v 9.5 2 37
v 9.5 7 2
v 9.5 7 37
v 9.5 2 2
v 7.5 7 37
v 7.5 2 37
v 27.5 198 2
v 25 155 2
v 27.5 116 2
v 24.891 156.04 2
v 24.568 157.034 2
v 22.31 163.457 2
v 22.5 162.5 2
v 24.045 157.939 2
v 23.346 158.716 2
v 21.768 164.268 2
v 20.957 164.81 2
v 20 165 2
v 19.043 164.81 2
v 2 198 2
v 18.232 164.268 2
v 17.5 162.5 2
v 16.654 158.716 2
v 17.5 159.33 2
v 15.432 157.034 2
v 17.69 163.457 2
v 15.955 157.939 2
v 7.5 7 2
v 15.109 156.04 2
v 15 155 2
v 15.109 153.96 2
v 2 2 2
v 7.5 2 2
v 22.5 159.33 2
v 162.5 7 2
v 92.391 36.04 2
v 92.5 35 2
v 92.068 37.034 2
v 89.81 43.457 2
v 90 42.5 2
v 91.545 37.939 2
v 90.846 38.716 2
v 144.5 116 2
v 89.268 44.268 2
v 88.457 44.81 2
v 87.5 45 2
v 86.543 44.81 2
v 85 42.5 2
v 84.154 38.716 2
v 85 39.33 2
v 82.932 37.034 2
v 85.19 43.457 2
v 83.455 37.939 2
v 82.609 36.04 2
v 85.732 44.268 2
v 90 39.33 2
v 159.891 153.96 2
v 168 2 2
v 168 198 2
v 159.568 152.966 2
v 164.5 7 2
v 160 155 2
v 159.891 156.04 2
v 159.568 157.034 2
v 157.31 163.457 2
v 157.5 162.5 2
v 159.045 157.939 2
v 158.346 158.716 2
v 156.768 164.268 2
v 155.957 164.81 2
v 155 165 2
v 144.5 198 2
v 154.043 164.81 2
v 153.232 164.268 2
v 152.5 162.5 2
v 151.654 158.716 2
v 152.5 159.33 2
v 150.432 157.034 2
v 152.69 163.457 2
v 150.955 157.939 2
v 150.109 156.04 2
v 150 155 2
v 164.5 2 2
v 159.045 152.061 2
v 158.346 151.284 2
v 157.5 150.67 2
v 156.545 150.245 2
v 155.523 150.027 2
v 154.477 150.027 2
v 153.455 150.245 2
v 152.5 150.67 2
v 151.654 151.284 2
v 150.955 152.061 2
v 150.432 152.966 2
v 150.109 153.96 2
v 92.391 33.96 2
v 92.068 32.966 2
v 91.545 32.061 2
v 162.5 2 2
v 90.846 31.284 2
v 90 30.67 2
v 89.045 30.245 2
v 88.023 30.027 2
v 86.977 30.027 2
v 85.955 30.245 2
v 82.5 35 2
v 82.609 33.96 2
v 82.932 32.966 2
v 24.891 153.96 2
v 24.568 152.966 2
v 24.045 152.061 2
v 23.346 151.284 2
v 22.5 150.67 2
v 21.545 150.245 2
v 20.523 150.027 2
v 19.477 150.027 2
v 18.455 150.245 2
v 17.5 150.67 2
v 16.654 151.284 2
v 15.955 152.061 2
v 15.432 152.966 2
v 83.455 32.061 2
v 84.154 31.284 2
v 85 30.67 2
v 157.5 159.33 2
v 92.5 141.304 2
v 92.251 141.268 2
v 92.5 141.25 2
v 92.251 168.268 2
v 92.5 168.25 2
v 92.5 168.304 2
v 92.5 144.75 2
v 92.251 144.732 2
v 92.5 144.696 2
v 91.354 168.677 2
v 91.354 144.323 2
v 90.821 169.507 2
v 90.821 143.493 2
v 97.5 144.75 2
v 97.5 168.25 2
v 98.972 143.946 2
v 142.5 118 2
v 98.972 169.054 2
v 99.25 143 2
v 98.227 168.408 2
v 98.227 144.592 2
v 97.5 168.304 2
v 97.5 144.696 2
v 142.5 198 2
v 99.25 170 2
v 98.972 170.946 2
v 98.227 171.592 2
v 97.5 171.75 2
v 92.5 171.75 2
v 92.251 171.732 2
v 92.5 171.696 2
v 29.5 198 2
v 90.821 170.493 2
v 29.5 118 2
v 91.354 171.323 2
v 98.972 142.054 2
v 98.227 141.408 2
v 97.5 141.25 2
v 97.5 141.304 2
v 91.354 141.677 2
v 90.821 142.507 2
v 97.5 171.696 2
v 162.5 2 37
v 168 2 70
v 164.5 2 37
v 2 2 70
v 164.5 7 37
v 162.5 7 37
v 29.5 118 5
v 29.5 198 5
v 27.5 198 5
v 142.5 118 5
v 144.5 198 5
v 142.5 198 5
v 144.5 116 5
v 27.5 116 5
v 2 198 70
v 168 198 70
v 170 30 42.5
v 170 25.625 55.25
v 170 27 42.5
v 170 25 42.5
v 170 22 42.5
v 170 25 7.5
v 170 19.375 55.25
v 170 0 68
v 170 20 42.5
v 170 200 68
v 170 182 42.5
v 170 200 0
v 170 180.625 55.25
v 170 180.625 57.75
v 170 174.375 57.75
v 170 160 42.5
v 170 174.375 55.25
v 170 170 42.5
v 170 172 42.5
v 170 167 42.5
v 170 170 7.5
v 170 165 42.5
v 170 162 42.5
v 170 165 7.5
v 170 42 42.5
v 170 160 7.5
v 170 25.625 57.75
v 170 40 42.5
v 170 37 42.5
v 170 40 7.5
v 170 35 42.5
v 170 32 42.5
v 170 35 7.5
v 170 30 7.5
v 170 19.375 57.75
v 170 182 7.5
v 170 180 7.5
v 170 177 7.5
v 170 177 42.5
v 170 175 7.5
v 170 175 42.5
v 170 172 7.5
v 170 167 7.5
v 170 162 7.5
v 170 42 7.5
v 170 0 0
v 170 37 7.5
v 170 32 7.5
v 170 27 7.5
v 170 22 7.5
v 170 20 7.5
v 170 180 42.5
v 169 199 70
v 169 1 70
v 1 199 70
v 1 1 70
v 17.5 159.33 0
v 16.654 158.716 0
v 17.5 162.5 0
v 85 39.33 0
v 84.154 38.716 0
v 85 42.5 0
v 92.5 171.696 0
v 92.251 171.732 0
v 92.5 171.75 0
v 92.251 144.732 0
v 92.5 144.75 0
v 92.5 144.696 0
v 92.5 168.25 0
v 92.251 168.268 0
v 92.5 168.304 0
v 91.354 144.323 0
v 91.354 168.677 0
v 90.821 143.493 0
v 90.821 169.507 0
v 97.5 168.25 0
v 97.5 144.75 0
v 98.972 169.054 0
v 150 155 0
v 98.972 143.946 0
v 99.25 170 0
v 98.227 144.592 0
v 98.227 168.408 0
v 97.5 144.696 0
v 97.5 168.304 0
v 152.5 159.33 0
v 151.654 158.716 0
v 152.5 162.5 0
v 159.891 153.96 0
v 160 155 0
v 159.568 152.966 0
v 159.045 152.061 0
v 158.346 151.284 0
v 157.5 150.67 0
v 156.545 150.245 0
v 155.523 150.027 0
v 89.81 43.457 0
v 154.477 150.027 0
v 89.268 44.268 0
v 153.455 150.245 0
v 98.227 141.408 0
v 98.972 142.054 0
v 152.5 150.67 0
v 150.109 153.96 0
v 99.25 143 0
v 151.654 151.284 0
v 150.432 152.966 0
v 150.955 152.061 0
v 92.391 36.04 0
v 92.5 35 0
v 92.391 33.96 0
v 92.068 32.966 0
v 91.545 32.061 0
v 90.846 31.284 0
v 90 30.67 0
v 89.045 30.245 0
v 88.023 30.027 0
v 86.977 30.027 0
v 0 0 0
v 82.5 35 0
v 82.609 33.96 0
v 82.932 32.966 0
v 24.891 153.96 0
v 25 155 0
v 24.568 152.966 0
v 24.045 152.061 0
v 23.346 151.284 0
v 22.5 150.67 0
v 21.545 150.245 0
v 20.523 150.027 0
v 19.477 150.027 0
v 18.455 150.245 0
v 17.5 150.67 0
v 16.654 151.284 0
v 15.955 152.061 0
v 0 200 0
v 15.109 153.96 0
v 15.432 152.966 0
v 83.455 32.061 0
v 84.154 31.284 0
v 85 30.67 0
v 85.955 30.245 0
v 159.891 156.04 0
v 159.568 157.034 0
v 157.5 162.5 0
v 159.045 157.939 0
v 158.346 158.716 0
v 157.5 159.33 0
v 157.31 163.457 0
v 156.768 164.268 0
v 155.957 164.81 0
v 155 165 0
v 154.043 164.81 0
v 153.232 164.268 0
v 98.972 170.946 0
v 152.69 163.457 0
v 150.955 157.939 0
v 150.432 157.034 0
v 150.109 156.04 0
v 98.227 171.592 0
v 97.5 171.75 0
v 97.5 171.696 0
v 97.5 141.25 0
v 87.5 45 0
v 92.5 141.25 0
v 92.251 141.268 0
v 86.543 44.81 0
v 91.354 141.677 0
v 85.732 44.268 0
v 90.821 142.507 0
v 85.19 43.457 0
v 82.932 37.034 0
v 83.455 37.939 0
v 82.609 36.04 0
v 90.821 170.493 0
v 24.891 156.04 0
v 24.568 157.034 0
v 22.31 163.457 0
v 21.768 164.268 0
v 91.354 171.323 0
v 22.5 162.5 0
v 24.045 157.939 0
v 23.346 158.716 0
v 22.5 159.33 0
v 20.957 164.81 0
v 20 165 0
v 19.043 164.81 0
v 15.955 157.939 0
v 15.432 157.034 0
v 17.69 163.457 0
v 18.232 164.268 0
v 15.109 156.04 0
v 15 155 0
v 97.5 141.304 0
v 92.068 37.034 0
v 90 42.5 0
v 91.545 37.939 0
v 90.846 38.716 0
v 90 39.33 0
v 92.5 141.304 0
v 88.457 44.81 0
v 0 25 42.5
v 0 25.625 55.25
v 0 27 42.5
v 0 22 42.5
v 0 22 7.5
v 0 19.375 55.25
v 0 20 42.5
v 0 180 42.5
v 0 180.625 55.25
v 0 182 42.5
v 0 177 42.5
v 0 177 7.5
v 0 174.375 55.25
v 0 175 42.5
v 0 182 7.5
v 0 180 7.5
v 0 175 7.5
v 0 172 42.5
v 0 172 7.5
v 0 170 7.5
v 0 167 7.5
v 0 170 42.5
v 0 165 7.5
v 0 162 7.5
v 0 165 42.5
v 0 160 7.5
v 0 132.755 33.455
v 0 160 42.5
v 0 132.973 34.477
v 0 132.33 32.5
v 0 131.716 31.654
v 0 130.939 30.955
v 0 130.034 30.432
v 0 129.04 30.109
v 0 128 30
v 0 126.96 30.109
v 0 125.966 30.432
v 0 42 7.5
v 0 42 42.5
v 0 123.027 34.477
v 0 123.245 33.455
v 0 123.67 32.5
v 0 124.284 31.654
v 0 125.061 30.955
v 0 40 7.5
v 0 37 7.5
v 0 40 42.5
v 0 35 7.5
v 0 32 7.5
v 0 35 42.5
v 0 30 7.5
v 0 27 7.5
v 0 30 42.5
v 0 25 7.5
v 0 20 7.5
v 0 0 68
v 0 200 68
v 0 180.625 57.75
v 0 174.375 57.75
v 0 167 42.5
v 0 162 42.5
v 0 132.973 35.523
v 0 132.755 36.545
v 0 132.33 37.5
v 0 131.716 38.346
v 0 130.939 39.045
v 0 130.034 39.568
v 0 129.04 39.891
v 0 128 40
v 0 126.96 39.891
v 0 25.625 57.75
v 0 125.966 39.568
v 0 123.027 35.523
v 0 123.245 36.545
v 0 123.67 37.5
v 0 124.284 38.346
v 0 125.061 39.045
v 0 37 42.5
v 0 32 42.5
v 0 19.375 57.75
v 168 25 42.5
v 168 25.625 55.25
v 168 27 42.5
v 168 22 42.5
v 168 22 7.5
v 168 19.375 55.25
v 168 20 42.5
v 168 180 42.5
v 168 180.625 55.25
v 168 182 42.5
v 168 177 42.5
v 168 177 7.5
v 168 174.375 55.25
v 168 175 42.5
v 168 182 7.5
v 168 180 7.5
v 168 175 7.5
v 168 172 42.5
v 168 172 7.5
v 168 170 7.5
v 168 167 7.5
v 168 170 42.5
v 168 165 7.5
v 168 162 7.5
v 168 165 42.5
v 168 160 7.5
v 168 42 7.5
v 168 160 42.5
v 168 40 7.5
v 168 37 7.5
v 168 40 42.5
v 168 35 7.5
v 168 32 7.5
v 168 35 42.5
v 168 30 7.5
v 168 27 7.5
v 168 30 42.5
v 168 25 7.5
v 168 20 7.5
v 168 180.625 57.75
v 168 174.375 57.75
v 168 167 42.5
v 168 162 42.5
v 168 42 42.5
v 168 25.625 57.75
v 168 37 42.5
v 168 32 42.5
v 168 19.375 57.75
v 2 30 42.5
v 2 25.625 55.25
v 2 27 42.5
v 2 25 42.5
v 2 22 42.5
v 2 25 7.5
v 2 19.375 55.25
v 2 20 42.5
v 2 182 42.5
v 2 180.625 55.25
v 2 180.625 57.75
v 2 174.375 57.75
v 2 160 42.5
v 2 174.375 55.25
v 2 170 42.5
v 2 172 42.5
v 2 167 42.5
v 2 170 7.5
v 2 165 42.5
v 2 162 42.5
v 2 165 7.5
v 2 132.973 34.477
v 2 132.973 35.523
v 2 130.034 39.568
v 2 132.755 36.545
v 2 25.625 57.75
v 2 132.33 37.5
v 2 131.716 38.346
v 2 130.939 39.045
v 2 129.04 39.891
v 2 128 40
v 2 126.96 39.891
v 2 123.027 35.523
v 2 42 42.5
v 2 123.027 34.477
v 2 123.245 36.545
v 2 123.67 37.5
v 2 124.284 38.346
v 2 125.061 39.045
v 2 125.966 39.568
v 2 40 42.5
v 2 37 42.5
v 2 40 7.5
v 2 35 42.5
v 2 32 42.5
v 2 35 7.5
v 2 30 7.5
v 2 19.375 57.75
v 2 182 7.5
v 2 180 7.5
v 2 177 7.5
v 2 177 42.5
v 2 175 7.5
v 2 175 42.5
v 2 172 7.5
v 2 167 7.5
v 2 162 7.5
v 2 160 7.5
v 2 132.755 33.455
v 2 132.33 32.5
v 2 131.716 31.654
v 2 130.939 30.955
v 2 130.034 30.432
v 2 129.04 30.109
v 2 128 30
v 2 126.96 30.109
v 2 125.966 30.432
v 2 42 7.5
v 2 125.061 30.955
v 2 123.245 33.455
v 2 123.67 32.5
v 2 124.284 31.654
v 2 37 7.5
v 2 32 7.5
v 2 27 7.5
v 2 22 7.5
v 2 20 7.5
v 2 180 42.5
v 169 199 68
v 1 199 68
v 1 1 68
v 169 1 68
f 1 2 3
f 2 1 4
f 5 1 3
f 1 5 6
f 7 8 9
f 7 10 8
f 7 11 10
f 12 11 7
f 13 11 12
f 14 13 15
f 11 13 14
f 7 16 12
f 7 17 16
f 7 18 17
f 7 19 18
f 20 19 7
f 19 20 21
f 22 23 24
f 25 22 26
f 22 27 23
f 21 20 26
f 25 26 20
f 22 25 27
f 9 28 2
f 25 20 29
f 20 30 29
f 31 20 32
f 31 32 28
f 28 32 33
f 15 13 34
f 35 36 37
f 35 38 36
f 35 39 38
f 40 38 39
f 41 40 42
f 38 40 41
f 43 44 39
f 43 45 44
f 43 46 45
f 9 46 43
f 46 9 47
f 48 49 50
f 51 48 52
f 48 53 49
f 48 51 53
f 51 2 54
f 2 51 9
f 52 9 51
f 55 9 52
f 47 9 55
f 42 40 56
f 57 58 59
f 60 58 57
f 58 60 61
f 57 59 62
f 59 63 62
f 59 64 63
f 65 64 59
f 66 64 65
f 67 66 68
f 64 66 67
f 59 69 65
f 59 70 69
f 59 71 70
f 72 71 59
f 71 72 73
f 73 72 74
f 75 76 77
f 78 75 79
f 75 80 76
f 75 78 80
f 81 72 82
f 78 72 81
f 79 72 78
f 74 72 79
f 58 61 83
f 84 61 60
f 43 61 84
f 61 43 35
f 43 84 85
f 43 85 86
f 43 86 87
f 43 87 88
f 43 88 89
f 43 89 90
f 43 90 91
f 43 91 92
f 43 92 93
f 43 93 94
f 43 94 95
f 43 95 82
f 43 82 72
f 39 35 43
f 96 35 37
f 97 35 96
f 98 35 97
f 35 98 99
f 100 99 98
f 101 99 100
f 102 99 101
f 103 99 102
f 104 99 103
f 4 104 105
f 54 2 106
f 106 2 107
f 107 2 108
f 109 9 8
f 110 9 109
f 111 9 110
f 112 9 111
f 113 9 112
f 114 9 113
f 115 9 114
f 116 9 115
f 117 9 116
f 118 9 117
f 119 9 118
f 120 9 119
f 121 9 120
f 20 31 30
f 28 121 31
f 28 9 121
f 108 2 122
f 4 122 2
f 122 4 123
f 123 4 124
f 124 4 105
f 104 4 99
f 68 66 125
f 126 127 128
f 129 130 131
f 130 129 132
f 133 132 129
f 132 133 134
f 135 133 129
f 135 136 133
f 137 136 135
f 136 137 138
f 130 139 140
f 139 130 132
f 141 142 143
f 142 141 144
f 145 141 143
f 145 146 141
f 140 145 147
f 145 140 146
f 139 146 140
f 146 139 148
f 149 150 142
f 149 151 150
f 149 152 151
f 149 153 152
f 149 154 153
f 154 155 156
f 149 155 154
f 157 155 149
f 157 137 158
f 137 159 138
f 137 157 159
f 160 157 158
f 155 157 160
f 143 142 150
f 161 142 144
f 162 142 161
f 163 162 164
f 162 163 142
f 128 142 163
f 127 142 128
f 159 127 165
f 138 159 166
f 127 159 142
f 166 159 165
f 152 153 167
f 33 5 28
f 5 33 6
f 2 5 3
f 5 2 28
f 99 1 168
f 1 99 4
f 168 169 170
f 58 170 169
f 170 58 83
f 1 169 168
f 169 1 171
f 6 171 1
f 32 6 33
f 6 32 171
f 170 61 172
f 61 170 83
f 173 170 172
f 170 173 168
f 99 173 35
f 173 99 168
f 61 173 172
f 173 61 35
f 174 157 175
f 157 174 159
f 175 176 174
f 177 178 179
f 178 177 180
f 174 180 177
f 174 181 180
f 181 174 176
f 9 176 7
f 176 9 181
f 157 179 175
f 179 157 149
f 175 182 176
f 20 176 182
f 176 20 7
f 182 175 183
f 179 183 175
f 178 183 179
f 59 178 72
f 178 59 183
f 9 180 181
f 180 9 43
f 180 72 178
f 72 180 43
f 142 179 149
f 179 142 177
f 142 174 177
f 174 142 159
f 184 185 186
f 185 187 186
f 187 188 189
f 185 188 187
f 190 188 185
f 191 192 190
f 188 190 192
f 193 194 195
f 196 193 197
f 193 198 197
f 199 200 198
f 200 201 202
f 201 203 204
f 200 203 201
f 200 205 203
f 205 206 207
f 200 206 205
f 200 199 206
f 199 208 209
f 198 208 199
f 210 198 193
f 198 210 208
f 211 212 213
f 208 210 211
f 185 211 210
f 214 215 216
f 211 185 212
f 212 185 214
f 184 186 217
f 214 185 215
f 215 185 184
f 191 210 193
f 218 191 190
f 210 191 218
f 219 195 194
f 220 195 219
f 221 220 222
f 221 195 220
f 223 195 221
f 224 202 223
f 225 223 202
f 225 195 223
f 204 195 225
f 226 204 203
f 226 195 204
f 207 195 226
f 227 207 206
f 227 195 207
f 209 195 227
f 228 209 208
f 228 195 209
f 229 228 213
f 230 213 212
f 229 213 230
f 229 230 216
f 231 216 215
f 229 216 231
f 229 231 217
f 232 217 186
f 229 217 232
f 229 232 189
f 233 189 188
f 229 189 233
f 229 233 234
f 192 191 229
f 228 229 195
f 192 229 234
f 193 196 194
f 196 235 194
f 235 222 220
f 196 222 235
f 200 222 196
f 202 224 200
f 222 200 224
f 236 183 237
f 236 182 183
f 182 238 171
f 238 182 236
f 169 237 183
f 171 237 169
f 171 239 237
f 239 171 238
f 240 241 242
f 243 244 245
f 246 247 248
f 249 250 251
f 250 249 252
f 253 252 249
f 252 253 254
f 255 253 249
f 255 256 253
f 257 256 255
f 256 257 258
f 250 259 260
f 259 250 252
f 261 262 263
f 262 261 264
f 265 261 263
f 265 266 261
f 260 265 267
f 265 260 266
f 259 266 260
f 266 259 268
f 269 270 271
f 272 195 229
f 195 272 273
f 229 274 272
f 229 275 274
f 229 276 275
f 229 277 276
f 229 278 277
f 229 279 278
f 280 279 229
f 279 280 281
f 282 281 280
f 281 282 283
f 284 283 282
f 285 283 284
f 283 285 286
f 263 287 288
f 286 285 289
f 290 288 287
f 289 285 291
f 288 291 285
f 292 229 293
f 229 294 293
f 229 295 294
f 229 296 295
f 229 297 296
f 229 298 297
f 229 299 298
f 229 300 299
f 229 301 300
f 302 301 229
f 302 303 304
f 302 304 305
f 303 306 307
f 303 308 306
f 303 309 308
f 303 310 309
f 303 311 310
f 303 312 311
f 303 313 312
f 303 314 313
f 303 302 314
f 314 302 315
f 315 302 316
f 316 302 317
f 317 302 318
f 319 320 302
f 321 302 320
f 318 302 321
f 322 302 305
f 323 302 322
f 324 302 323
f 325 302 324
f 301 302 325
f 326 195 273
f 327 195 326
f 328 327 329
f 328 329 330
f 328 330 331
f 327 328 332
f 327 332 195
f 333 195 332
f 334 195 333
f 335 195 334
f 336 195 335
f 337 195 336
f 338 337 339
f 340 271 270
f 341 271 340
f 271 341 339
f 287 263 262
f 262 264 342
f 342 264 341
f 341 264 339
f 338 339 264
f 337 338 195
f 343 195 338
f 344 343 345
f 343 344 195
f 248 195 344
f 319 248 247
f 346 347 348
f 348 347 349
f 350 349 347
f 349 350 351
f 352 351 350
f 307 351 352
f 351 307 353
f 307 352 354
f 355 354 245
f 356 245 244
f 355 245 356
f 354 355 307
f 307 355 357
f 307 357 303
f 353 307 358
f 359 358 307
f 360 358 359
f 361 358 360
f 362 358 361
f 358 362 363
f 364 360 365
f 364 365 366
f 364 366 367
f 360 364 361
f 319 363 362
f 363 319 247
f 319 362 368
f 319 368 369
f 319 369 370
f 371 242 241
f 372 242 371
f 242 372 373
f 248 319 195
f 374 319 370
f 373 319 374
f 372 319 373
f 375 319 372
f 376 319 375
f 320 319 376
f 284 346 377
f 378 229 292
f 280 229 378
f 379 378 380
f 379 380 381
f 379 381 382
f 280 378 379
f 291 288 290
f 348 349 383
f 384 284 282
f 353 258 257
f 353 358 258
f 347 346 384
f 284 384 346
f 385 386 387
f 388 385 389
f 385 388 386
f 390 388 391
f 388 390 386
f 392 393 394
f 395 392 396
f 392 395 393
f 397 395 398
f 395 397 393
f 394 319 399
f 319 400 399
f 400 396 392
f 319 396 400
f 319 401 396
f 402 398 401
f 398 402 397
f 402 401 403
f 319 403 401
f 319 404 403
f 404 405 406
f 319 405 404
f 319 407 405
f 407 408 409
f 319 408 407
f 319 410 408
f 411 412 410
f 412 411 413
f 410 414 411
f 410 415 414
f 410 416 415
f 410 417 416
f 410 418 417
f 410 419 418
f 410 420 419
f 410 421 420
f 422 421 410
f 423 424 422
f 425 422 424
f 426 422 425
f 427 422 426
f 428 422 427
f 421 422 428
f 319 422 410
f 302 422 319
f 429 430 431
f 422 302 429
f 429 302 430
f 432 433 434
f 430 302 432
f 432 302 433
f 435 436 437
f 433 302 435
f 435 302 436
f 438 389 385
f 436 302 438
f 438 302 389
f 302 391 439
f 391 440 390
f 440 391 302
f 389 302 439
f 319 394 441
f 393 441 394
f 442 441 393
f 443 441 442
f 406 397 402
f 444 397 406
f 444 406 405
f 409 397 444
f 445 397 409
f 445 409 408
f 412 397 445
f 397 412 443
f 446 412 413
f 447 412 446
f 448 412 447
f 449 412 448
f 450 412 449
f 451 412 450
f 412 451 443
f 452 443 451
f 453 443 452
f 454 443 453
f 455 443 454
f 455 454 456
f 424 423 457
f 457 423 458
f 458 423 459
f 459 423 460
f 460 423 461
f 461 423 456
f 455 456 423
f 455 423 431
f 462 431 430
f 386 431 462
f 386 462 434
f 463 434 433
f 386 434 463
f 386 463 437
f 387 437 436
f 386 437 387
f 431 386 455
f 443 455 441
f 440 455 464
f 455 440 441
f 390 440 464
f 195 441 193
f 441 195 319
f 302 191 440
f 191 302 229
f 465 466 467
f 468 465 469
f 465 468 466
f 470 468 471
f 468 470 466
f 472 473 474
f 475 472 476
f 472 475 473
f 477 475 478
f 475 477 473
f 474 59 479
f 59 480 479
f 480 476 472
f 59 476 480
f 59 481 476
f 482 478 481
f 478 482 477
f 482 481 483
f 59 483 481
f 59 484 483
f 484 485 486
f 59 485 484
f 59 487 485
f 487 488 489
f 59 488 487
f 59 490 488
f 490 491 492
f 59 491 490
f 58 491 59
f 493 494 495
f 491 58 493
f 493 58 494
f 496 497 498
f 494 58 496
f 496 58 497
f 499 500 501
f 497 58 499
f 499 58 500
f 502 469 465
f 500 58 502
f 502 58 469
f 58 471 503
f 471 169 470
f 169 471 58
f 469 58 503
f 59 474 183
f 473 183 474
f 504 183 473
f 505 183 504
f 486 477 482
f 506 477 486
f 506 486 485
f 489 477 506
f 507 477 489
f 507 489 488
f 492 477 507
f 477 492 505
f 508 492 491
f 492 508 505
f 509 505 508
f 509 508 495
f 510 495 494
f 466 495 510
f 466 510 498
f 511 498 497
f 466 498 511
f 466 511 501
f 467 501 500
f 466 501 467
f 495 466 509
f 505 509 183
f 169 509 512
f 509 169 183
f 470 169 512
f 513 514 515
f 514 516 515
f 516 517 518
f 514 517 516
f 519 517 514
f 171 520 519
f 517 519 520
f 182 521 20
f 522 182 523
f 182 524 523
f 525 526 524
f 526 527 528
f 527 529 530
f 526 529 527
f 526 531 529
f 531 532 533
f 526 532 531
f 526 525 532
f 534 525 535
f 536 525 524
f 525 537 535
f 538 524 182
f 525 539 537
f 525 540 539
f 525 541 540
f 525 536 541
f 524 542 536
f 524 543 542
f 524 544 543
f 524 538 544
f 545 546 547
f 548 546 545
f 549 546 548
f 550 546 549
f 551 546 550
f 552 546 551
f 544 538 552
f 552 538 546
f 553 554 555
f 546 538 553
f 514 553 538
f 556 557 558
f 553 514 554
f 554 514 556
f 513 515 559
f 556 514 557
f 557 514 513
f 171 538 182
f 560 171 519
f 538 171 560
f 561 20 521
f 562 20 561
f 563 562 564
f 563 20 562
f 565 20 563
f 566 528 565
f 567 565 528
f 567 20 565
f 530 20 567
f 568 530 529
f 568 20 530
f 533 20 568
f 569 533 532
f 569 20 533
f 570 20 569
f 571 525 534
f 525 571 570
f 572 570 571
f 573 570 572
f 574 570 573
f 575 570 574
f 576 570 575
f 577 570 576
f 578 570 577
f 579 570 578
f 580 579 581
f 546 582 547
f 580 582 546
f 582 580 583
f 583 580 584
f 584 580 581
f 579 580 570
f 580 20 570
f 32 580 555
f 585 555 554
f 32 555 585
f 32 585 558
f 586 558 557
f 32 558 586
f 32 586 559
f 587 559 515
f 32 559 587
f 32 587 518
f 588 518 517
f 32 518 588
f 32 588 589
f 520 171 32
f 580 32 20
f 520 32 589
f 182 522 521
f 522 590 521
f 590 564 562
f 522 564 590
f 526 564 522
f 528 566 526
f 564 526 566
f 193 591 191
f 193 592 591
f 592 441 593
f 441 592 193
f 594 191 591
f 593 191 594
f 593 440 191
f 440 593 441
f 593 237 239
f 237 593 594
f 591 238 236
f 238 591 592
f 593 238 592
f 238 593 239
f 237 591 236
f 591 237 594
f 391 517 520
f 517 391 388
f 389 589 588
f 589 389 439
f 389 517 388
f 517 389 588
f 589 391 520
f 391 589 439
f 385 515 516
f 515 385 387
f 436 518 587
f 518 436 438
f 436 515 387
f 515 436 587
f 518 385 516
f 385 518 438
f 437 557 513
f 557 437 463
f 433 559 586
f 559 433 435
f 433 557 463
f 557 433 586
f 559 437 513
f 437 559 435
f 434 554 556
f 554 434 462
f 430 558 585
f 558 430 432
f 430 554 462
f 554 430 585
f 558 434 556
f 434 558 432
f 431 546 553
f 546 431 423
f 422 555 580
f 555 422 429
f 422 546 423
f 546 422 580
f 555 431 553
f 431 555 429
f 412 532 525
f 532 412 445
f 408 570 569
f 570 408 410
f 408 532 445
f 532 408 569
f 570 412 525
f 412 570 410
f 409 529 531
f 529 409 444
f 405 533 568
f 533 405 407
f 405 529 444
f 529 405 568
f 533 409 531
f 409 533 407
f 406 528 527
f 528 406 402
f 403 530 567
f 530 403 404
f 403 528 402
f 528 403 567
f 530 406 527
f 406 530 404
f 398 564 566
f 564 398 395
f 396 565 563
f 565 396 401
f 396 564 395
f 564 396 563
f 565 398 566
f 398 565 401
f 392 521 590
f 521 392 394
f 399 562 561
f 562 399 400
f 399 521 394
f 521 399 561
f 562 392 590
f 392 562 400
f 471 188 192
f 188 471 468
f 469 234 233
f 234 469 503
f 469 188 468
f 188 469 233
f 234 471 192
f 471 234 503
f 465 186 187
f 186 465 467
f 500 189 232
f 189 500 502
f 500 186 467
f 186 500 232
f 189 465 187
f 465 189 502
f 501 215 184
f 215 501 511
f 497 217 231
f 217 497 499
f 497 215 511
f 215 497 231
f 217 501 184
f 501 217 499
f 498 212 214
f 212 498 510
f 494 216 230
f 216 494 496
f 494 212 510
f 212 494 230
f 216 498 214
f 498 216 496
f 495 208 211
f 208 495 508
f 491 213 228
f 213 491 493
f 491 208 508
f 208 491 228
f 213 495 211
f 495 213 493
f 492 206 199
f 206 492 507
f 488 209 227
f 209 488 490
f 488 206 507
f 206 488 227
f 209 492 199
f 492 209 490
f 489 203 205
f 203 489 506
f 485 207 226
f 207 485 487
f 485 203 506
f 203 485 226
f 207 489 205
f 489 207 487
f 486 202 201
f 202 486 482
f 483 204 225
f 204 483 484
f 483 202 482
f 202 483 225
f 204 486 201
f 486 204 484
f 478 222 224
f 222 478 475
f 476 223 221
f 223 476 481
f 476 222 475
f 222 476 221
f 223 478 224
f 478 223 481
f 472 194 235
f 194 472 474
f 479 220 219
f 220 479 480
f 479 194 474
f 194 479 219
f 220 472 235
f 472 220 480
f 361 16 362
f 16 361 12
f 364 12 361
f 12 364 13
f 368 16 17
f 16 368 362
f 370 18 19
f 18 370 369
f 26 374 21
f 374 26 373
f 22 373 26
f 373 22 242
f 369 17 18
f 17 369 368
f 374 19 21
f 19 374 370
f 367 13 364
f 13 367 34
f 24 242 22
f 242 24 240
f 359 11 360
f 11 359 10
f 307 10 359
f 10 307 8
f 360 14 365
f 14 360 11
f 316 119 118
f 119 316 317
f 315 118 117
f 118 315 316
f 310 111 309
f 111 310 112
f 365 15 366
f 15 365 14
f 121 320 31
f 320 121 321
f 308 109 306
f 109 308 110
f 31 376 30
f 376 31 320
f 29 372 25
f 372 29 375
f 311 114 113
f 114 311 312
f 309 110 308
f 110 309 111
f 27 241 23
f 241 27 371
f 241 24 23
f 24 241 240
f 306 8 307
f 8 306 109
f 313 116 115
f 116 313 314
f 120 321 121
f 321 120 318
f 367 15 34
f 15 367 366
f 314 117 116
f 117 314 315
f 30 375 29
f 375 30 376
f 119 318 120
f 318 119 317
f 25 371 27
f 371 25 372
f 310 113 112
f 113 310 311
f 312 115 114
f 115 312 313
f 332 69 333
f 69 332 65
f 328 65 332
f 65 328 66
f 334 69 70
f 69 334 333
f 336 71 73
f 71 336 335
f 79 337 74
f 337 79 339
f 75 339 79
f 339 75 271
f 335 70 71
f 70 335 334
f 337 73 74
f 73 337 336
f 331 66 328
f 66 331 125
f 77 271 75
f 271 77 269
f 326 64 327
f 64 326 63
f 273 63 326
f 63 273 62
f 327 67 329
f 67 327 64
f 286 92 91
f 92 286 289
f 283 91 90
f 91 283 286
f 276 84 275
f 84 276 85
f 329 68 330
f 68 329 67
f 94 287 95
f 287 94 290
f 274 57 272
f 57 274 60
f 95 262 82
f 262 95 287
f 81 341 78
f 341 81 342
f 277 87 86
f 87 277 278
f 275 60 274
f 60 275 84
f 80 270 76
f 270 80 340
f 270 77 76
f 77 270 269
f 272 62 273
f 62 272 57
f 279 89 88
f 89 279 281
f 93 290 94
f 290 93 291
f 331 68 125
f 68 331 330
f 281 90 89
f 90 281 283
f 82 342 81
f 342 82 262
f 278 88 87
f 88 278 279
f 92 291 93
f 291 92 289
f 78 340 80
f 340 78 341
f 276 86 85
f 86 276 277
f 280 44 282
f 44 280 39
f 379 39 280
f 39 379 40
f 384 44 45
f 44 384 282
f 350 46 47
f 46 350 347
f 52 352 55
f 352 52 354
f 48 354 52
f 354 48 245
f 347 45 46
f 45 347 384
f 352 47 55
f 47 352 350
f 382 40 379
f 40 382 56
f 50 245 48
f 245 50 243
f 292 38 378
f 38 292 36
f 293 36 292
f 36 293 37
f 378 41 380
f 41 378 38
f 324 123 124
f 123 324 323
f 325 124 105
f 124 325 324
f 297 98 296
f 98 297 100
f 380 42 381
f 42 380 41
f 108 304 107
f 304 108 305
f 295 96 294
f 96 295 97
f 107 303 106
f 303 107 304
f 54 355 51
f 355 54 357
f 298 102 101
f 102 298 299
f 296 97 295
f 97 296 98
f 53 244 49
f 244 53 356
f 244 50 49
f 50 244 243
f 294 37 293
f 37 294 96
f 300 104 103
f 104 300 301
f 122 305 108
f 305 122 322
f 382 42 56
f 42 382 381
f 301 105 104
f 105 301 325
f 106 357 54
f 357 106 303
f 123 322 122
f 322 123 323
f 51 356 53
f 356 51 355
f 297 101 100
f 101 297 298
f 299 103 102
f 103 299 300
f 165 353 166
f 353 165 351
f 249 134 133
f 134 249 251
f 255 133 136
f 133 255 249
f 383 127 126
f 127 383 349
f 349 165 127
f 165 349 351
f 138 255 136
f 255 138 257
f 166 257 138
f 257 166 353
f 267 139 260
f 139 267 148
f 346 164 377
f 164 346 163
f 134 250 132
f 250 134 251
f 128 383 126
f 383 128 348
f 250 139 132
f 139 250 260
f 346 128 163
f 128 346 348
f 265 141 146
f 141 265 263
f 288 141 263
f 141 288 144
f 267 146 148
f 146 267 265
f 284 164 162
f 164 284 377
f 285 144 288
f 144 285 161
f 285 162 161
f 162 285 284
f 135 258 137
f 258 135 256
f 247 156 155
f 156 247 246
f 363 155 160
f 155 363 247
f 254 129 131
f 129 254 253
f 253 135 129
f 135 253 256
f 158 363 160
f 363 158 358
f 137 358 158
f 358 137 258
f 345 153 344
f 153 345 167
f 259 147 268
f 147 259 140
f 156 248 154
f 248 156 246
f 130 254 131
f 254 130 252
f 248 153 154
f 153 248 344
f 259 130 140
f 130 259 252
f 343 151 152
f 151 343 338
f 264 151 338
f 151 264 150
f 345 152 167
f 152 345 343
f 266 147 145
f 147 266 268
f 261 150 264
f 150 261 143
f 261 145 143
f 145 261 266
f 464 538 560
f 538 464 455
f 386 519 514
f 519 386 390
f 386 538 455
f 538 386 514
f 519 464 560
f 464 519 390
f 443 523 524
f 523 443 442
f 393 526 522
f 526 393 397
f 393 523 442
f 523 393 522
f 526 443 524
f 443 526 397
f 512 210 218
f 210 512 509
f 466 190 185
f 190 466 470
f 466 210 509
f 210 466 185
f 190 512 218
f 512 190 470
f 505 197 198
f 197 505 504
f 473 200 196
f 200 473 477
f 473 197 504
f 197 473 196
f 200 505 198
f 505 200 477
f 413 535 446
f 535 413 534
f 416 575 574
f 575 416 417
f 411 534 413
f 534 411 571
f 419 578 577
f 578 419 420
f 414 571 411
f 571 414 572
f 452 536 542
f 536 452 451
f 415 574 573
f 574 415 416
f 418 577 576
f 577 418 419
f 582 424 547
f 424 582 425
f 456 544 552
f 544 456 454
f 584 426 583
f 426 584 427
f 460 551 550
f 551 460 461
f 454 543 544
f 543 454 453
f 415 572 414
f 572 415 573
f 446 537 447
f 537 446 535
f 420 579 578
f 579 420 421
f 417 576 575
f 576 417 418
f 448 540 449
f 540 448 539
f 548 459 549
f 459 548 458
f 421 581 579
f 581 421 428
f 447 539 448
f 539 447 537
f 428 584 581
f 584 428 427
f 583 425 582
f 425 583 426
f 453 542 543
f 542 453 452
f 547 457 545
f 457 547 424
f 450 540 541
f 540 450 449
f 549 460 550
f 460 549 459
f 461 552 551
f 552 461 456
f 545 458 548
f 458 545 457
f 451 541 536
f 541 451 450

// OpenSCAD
// ===========================================================================
//  Copyright (C) 2021   Walter Pirri
//
//  This library is free software; you can redistribute it and/or
//  modify it under the terms of the GNU Lesser General Public
//  License as published by the Free Software Foundation; either
//  version 2.1 of the License, or (at your option) any later version.
//
//  This library is distributed in the hope that it will be useful,
//  but WITHOUT ANY WARRANTY; without even the implied warranty of
//  MERCHANTABILITY or FITNESS FOR A PARTICULAR PURPOSE.  See the GNU
//  Lesser General Public License for more details.
//
//  You should have received a copy of the GNU Lesser General Public
//  License along with this library; if not, write to the Free Software
//  Foundation, Inc., 59 Temple Place, Suite 330, Boston, MA  02111-1307  USA
// ===========================================================================

// ===========================================================================
// Cuerpo de la caja para central de domotica
// HELP: https://en.wikibooks.org/wiki/OpenSCAD_User_Manual/Primitive_Solids
// ===========================================================================

inicial=[0,0,0];
$fs = 1;

// Medidas de la caja y tapa
ancho=170;
alto=200;
profundidad=70;
pared=2;
ancho_bateria = 155;
ancho_fuente = 115;
alto_fuente = 82;

// Detalles de la caja (se usan tambien en la Tapa)
profundidad_calado=2;   // Calado superior en los bodes

// Detalles de la Tapa (Se usan también en la caja)
traba_ancho=5;
traba_alto=13;
traba_pestana=1;
traba_distancia_vertical=20;
orificio_cables = 10;


//
// Caja
//

module entrada_cables()
{
    translate(inicial + [0, alto-alto_fuente+orificio_cables, profundidad/2]) rotate([0,90, 0]) cylinder(h=pared, d=orificio_cables, center=false);
}


module tornillo_fuente()
{
    diametro_orificio = 3.5;
    h_orificio1 = 25;
    h_orificio2 = 52;

    pos_orificio_i = 65;
    pos_orificio_d = 70;
    diff_orificios = pos_orificio_d - pos_orificio_i;
    
    tope_derecho_fuente = (ancho / 2) - (ancho_fuente / 2);
    
    translate(inicial + [tope_derecho_fuente + pos_orificio_i, (alto - alto_fuente + h_orificio1), 0])
        cylinder(h = pared, d = diametro_orificio, center = false);
    translate(inicial + [tope_derecho_fuente + pos_orificio_i, (alto - alto_fuente + h_orificio1 - (diametro_orificio/2)), 0])
        cube([diff_orificios,diametro_orificio,pared]);
    translate(inicial + [tope_derecho_fuente + pos_orificio_d, (alto - alto_fuente + h_orificio1), 0])
        cylinder(h = pared, d = diametro_orificio, center = false);
    
    translate(inicial + [tope_derecho_fuente + pos_orificio_i, (alto - alto_fuente + h_orificio2), 0])
        cylinder(h = pared, d = diametro_orificio, center = false);
    translate(inicial + [tope_derecho_fuente + pos_orificio_i, (alto - alto_fuente + h_orificio2 - (diametro_orificio/2)), 0])
        cube([diff_orificios,diametro_orificio,pared]);
    translate(inicial + [tope_derecho_fuente + pos_orificio_d, (alto - alto_fuente + h_orificio2), 0])
        cylinder(h = pared, d = diametro_orificio, center = false);
}

module seccion_fuente()
{
    tope_fuente_x1 = (ancho / 2) - (ancho_fuente / 2);
    tope_fuente_x2 = (ancho / 2) + (ancho_fuente / 2);
    tope_fuente = 3;

    translate(inicial + [tope_fuente_x1, (alto-pared-alto_fuente), pared]) cube([2,alto_fuente,tope_fuente]);
    translate(inicial + [tope_fuente_x2, (alto-pared-alto_fuente), pared]) cube([2,alto_fuente,tope_fuente]);

    translate(inicial + [tope_fuente_x1, (alto-pared-alto_fuente), pared]) cube([ancho_fuente,2,tope_fuente]);
    
}

module tope_bateria()
{
    tope_bateria_x1 = (ancho / 2) - (ancho_bateria / 2);
    tope_bateria_x2 = (ancho / 2) + (ancho_bateria / 2);
    translate(inicial + [tope_bateria_x1, pared, pared]) cube([2,5,(profundidad/2)]);
    translate(inicial + [tope_bateria_x2, pared, pared]) cube([2,5,(profundidad/2)]);
}

module orificio_fijacion(xyz)
{
    translate(xyz + [2.5,2.5,0]) cylinder(h=pared, d=5, center=false);
    translate(xyz - [0,2.5,0]) cube([5,5,pared], center=false);
    translate(xyz + [2.5,0,0] - [0,5,0]) cylinder(h=pared, d=10, center=false);
}

module ventilacion_z(xyz, largo)
{
    translate(xyz) cube([pared,2,largo]);
    translate(xyz + [0,5,0]) cube([pared,2,largo]);
    translate(xyz + [0,10,0]) cube([pared,2,largo]);
    translate(xyz + [0,15,0]) cube([pared,2,largo]);
    translate(xyz + [0,20,0]) cube([pared,2,largo]);
}

module cajon(xyz, x, y, z, p)
{
    tope_bateria();
    seccion_fuente();
    difference()
    {
        translate(xyz) cube([x,y,z], false);
        translate(xyz + [p,p,p]) cube([x-(2*p),y-(2*p),z], false);
    }
}

module calado_borde(xyz, b, h)
{
    translate(xyz) cube([b, (pared/2), profundidad_calado], false);
    translate(xyz+[0,h-1,0]) cube([b, (pared/2), profundidad_calado], false);
    translate(xyz) cube([(pared/2), h, profundidad_calado], false);
    translate(xyz+[b-1,0,0]) cube([(pared/2), h, profundidad_calado], false);
    
}

module orificio_traba(xyz, dir)
{
    if(dir == 1)
    {
        translate(xyz-[0,(traba_ancho*0.125),0]+[0,0,(pared*0.125)]) cube([pared,(traba_ancho*1.25),(pared*1.25)], false);
    }
    else
    {
        translate(xyz-[pared,(traba_ancho*0.125),0]+[0,0,(pared*0.125)]) cube([pared,(traba_ancho*1.25),(pared*1.25)], false);
    }
}

module Caja()
{
    difference()
    {
        cajon(inicial, ancho, alto, profundidad, pared);
        // -- menos -->
        calado_borde(inicial + [0,0,profundidad-2], ancho, alto);
        orificio_traba([0,traba_distancia_vertical,profundidad-traba_alto-pared], 1);
        orificio_traba([0,alto-traba_distancia_vertical-traba_ancho,profundidad-traba_alto-pared], 1);
        
        orificio_traba([ancho,traba_distancia_vertical,profundidad-traba_alto-pared], 2);
        orificio_traba([ancho,alto-traba_distancia_vertical-traba_ancho,profundidad-traba_alto-pared], 2);
        
        ventilacion_z([0,20,(profundidad/4)-10], (profundidad/2));
        ventilacion_z([0,(alto-40),(profundidad/4)-10], (profundidad/2));
        
        ventilacion_z([(ancho-pared),20,(profundidad/4)-10], (profundidad/2));
        ventilacion_z([(ancho-pared),(alto-40),(profundidad/4)-10], (profundidad/2));
        
        orificio_fijacion([((ancho/2)-(ancho_fuente/2)-10),alto-40,0]);
        orificio_fijacion([((ancho/2)+(ancho_fuente/2)+10),alto-40,0]);
        orificio_fijacion([ancho/2,40,0]);

        entrada_cables();
        
        tornillo_fuente();
    }
}

//
// Tapa
//

module ventilacion_x(xyz, largo)
{
    pos = 0;
    for(i = [0:5:largo])
    {
        translate(xyz + [i,0,0]) cube([2,20,pared]);
    }
}

module traba(xyz, dir)
{
    if(dir == 1)
    {
        translate(xyz) cube([pared,traba_ancho,traba_alto], false);
        translate(xyz + [-(traba_pestana),0,traba_alto]) cube([(traba_pestana+pared),traba_ancho,pared], false);
    }
    else
    {
        translate(xyz - [pared,0,0]) cube([pared,traba_ancho,traba_alto], false);
        translate(xyz - [pared,0,0]+ [0,0,traba_alto]) cube([(traba_pestana+pared),traba_ancho,pared], false);
    }
}

module bordes(xyz, b, h)
{
    translate(xyz) cube([b, (pared/2), profundidad_calado], false);
    translate(xyz) cube([(pared/2), h, profundidad_calado], false);
    translate(xyz + [b-(pared/2),0,0]) cube([(pared/2), h, profundidad_calado], false);
    translate(xyz + [0,h-(pared/2),0]) cube([b, (pared/2), profundidad_calado], false);
}

module frente_tapa()
{
    translate(inicial) cube([ancho, alto, pared], false);

    bordes(inicial + [0,0,pared], ancho, alto);

    traba(inicial + [pared, traba_distancia_vertical,pared], 1);
    traba(inicial + [pared, alto-traba_distancia_vertical-traba_ancho,pared], 1);
    traba(inicial + [ancho-pared, traba_distancia_vertical,pared], 2);
    traba(inicial + [ancho-pared, alto-traba_distancia_vertical-traba_ancho,pared], 2);

}

module Tapa()
{
    difference()
    {
        frente_tapa();

        ventilacion_x([(ancho/4),20,0], (ancho/2));
        ventilacion_x([(ancho/4),(alto-40),0], (ancho/2));
    }
}

//
// Construcción
//


Caja();
//Tapa();
